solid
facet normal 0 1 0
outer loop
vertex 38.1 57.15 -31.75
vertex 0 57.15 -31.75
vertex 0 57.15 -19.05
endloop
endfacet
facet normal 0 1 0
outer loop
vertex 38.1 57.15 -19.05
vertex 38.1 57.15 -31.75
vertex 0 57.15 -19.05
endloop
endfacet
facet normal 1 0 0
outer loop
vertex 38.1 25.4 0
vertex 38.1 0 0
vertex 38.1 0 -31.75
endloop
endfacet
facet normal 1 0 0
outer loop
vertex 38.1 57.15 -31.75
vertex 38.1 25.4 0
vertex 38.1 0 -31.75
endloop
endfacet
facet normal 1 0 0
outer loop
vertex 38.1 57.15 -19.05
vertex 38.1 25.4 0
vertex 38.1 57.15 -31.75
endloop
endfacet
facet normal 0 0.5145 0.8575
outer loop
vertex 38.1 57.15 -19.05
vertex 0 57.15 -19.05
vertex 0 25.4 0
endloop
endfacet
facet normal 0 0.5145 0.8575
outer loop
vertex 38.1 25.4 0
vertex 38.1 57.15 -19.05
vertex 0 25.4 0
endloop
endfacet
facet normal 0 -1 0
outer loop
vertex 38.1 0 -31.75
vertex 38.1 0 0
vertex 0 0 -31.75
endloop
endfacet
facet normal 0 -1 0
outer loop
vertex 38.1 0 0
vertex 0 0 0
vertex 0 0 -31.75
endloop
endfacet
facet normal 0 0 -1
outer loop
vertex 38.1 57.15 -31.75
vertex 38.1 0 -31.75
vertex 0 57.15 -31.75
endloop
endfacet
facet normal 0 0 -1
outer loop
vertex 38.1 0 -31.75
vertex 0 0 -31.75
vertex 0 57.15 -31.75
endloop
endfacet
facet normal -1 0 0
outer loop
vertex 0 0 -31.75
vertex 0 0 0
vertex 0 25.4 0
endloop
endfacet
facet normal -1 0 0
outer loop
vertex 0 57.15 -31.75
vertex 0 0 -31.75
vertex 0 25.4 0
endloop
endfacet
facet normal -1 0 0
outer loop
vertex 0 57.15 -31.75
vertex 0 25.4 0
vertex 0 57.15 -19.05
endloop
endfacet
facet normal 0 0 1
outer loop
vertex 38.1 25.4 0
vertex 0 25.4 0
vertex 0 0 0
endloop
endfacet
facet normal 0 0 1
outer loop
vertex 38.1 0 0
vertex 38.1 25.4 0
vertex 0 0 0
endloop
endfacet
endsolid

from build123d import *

# Parameters (mm, degrees)
F1_DEPTH = 25.4
F2_DEPTH = 12.7


with BuildPart() as f1:
    # F0 (on Right) → F1 (new body)
    with BuildSketch(Plane.YZ):
        Polygon((25.4, 0), (0, 0), (0, -31.75), (57.15, -31.75), (57.15, -19.05), align=None)
    extrude(amount=F1_DEPTH)

    # F1_face (on face) → F2 (join)
    with BuildSketch(Plane(origin=(25.4, 24.976667, -17.78), x_dir=(0, 1, 0), z_dir=(1, 0, 0))):
        Polygon((0.423333, 17.78), (-24.976667, 17.78), (-24.976667, -13.97), (32.173333, -13.97), (32.173333, -1.27), align=None)
    extrude(amount=F2_DEPTH)


solid = f1.part
